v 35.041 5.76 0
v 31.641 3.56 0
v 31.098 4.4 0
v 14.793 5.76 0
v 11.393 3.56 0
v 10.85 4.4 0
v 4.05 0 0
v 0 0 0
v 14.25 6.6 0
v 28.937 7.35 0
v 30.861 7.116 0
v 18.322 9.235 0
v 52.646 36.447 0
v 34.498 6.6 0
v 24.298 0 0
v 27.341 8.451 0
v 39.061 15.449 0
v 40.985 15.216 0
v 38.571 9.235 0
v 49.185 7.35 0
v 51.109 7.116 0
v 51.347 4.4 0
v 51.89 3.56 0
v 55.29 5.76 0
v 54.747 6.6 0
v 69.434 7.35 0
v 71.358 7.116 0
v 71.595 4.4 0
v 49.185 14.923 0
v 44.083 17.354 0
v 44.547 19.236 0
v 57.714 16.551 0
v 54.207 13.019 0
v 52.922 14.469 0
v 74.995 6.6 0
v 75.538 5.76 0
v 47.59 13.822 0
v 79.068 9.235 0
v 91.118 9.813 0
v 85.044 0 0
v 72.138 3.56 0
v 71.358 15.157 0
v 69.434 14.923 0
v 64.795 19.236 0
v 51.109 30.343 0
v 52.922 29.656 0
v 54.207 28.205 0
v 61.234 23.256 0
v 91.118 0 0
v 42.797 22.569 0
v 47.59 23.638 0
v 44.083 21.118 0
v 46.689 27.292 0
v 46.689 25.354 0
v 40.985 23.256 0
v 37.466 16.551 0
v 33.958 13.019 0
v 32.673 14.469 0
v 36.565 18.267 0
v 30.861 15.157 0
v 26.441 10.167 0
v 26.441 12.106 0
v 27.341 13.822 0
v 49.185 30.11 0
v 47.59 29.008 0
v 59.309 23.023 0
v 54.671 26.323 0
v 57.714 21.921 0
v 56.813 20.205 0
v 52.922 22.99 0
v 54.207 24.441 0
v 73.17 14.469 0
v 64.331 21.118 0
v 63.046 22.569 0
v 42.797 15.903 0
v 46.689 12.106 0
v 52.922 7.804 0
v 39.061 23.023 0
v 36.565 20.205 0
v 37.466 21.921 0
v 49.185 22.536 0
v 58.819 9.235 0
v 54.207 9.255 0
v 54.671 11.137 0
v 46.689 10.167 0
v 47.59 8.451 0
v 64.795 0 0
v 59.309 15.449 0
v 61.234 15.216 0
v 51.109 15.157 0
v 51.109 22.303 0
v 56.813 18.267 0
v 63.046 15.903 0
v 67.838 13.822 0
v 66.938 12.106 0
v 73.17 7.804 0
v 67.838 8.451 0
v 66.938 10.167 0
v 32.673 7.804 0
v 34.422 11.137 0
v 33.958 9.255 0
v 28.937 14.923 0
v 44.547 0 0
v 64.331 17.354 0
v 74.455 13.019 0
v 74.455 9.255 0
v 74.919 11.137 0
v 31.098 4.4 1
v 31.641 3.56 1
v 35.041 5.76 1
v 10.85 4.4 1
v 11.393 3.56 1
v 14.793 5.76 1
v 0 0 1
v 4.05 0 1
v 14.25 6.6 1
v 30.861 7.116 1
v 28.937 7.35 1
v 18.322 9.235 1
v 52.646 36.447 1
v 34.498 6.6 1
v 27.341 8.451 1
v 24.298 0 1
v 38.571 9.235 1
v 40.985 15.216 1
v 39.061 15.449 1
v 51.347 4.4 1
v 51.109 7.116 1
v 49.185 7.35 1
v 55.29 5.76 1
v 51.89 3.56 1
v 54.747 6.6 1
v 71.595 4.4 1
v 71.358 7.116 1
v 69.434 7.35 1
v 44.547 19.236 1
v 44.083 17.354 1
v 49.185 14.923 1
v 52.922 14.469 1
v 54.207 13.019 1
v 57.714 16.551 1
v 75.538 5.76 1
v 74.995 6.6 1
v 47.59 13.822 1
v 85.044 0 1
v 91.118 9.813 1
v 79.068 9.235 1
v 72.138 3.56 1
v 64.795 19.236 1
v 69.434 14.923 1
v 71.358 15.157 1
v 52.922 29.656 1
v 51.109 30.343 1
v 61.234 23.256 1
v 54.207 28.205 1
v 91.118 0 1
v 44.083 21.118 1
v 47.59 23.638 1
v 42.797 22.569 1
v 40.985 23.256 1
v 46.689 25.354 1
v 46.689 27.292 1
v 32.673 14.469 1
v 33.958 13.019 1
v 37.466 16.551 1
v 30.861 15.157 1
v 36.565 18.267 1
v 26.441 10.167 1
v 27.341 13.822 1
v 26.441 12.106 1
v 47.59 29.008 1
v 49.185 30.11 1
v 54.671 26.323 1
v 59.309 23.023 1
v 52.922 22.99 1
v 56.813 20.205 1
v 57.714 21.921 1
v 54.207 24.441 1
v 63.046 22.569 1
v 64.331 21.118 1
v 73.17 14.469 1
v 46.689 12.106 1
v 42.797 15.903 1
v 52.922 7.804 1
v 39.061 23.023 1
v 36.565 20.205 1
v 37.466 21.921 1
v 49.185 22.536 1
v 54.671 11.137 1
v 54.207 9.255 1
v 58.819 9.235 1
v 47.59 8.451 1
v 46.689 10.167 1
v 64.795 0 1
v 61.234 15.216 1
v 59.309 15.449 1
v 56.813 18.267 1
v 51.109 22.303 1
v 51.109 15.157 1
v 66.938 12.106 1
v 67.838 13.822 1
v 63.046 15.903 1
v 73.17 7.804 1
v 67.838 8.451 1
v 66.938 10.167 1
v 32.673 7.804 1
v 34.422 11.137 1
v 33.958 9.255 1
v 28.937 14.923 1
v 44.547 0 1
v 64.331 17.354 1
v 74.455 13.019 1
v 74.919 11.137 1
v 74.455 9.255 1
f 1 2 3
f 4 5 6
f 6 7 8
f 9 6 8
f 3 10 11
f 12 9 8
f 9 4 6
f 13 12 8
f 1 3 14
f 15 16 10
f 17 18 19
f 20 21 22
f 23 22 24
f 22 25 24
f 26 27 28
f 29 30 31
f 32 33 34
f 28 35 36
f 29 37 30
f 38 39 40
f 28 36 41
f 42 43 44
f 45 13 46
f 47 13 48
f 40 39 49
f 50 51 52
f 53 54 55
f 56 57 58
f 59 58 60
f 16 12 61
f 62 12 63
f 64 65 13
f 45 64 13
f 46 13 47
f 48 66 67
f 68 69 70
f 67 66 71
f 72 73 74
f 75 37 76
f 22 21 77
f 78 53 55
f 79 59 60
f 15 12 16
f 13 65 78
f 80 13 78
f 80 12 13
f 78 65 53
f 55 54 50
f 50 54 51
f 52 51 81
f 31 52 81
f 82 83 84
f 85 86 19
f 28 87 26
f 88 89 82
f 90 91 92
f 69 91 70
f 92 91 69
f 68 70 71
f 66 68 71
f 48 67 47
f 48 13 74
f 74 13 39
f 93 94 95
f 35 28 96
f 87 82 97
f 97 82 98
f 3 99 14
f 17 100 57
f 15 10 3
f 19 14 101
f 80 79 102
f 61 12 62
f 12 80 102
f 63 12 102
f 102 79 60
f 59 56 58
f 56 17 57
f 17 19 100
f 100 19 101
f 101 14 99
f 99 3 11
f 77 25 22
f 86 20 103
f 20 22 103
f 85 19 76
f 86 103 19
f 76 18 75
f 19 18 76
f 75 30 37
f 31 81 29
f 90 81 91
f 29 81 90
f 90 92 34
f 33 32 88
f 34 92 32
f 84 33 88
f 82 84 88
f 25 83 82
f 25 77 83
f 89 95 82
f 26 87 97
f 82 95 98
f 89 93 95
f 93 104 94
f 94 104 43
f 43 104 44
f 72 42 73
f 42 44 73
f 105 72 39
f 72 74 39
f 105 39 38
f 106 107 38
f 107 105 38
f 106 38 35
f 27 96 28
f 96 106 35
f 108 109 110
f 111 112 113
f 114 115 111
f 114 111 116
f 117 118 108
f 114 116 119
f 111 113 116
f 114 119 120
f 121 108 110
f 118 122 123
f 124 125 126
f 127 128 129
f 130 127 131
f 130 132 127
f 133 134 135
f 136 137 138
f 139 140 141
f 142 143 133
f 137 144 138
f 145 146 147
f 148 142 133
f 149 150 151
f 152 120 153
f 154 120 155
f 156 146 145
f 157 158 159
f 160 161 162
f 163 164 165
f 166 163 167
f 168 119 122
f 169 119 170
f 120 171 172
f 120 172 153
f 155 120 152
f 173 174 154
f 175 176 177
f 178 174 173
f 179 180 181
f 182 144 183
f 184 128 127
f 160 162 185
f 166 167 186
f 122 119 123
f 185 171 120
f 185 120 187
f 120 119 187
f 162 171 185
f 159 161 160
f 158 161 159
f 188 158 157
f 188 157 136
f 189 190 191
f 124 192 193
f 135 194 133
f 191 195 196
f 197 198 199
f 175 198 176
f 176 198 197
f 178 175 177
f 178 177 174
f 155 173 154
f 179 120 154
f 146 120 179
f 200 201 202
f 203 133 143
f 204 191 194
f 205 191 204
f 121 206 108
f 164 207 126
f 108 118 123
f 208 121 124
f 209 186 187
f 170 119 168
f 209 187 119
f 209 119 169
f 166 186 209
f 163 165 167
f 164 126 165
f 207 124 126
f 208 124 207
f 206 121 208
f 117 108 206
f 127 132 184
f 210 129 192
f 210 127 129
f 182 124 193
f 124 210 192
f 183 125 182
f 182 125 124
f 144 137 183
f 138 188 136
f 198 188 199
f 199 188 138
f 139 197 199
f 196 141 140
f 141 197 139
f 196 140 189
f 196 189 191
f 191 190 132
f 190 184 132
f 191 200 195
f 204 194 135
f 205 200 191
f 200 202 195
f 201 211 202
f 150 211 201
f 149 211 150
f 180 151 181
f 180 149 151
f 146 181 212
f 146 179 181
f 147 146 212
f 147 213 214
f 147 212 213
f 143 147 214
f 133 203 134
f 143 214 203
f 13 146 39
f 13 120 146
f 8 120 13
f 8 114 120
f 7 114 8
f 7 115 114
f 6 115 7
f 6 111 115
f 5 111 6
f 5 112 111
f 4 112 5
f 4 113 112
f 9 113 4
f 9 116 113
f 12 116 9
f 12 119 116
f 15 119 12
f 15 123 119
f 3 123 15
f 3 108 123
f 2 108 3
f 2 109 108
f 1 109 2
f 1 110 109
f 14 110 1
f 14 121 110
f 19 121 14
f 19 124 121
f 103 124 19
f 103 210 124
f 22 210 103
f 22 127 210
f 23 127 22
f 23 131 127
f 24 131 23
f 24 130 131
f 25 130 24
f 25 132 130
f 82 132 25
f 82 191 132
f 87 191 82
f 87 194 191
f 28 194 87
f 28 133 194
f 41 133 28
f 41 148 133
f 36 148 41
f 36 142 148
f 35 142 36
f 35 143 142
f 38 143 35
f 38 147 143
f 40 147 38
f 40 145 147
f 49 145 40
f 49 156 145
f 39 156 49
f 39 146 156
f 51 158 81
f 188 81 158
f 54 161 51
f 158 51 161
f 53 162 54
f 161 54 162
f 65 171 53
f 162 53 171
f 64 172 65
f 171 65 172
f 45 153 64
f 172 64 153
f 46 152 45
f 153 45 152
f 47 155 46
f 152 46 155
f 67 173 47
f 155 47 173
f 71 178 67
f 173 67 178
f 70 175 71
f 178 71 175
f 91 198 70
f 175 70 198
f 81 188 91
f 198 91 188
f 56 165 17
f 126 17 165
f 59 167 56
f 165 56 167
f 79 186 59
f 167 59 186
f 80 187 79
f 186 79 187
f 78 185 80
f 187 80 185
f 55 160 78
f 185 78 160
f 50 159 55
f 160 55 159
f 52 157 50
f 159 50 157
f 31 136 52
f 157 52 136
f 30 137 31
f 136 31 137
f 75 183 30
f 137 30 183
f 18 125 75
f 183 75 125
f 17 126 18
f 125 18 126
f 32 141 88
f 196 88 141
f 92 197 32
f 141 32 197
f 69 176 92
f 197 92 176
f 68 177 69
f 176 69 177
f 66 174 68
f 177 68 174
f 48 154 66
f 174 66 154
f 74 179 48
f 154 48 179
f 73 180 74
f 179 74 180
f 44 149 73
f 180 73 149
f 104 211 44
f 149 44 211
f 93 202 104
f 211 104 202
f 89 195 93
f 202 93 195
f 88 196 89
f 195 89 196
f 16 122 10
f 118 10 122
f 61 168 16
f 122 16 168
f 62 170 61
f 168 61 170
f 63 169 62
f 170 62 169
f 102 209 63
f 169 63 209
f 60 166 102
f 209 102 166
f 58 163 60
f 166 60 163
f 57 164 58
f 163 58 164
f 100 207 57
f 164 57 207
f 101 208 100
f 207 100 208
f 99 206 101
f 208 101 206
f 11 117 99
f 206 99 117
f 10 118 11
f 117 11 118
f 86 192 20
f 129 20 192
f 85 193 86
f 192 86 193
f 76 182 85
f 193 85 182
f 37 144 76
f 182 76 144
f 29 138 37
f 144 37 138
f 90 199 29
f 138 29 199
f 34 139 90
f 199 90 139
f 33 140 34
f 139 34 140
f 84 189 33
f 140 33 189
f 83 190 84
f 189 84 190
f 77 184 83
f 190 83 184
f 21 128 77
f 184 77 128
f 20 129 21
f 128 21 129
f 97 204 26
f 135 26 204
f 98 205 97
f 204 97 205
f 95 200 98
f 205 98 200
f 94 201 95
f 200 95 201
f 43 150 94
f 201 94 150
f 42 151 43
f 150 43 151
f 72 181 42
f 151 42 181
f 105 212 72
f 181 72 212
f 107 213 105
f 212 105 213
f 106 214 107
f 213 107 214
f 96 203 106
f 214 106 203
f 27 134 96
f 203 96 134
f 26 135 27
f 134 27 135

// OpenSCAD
/*
 * Miniature Paint Shelves
 * By Craig Wood
 *
 * Copyright 2019 Craig Wood - http://github.com/w3ace
 * This program is free software: you can redistribute it and/or modify
 * it under the terms of the GNU General Public License as published by
 * the Free Software Foundation, either version 3 of the License, or
 * (at your option) any later version.
 *
 * This program is distributed in thehope that it will be useful,
 * but WITHOUT ANY WARRANTY; without even the implied warranty of
 * MERCHANTABILITY or FITNESS FOR A PARTICULAR PURPOSE.  See the
 * GNU General Public License for more details.
 *
 * See <http://www.gnu.org/licenses/>.

 */



num_shelves = 4;
//shelf_width = 44;
//shelf_depth = 28;

shelf_width=17;
shelf_depth=11;

shelf_thickness = 1;

/*	hyp = hypotenuse(shelf_width,shelf_depth);
	linear_extrude(height=shelf_thickness)
	translate([-hyp*.8,0,0])	
			for(i=[1:num_shelves])
			{
				color("Red")
				translate([hypotenuse(shelf_width,shelf_depth)*i,0,0])
					rotate([0,0,90-atan(shelf_width/shelf_depth	)])
						difference ()
						{					
						translate([0,-shelf_depth,0])
							square(size=[shelf_width,shelf_depth]);
						translate([hyp*.4,-shelf_thickness,0])	
							square(size=[hyp*.2,shelf_thickness]);
						}
			}

*/

make_shelf_upright (num_shelves,shelf_width,shelf_depth,shelf_thickness);


function hypotenuse (l1,l2) = sqrt(l1*l1+l2*l2);



module make_shelf_upright (num_shelves,shelf_width,shelf_depth,shelf_thickness)
{

	hyp = hypotenuse(shelf_width,shelf_depth);

	linear_extrude(height=shelf_thickness)
		difference()
		{

			// MAIN TRIANGLE
			polygon(points=[[0,0],[hyp*(num_shelves+1.2),0],[hyp*2.6,hyp*1.8]]);

			// SHELF CUTOUTS 
			translate([-hyp*.8,0,0])	
			for(i=[1:num_shelves])
			{
				color("Red")
				translate([hypotenuse(shelf_width,shelf_depth)*i,0,0])
					rotate([0,0,90-atan(shelf_width/shelf_depth	)])
						difference ()
						{					
						translate([0,-shelf_depth,0])
							square(size=[shelf_width,shelf_depth]);
						translate([hyp*.4,-shelf_thickness,0])	
							square(size=[hyp*.2,shelf_thickness]);
						}
			}

			// ROWS OF CIRCLE CUTOUTS
			for(i=[1:num_shelves-1])
				translate([hyp*i+hyp*.5,hyp*.55,0])
					circle(d=hyp*.4);

			for(i=[1:num_shelves-2])
				translate([hyp*i+hyp,hyp*.95,0])
					circle(d=hyp*.4);
			
			for(i=[1:num_shelves-3])
				translate([hyp*i+hyp*1.5,hyp*1.3,0])
					circle(d=hyp*.4);

			//CUT OFF THE BOTTOM POINT
			polygon(points=[[hyp*(num_shelves+.5),0],[hyp*(num_shelves+2),0],[(hyp*(num_shelves+.5)),hyp]]);		
		}
}
/*
union()
{
	for(i = [1:num_shelves])
	{	
		translate([(num_shelves-i)*shelf_width,(i-1)*shelf_depth])	
			scale([i-(i*.25),i])
				polygon(points=[[0,0],[shelf_width,0],[0,shelf_depth*3]]);


	}
}	

*/
